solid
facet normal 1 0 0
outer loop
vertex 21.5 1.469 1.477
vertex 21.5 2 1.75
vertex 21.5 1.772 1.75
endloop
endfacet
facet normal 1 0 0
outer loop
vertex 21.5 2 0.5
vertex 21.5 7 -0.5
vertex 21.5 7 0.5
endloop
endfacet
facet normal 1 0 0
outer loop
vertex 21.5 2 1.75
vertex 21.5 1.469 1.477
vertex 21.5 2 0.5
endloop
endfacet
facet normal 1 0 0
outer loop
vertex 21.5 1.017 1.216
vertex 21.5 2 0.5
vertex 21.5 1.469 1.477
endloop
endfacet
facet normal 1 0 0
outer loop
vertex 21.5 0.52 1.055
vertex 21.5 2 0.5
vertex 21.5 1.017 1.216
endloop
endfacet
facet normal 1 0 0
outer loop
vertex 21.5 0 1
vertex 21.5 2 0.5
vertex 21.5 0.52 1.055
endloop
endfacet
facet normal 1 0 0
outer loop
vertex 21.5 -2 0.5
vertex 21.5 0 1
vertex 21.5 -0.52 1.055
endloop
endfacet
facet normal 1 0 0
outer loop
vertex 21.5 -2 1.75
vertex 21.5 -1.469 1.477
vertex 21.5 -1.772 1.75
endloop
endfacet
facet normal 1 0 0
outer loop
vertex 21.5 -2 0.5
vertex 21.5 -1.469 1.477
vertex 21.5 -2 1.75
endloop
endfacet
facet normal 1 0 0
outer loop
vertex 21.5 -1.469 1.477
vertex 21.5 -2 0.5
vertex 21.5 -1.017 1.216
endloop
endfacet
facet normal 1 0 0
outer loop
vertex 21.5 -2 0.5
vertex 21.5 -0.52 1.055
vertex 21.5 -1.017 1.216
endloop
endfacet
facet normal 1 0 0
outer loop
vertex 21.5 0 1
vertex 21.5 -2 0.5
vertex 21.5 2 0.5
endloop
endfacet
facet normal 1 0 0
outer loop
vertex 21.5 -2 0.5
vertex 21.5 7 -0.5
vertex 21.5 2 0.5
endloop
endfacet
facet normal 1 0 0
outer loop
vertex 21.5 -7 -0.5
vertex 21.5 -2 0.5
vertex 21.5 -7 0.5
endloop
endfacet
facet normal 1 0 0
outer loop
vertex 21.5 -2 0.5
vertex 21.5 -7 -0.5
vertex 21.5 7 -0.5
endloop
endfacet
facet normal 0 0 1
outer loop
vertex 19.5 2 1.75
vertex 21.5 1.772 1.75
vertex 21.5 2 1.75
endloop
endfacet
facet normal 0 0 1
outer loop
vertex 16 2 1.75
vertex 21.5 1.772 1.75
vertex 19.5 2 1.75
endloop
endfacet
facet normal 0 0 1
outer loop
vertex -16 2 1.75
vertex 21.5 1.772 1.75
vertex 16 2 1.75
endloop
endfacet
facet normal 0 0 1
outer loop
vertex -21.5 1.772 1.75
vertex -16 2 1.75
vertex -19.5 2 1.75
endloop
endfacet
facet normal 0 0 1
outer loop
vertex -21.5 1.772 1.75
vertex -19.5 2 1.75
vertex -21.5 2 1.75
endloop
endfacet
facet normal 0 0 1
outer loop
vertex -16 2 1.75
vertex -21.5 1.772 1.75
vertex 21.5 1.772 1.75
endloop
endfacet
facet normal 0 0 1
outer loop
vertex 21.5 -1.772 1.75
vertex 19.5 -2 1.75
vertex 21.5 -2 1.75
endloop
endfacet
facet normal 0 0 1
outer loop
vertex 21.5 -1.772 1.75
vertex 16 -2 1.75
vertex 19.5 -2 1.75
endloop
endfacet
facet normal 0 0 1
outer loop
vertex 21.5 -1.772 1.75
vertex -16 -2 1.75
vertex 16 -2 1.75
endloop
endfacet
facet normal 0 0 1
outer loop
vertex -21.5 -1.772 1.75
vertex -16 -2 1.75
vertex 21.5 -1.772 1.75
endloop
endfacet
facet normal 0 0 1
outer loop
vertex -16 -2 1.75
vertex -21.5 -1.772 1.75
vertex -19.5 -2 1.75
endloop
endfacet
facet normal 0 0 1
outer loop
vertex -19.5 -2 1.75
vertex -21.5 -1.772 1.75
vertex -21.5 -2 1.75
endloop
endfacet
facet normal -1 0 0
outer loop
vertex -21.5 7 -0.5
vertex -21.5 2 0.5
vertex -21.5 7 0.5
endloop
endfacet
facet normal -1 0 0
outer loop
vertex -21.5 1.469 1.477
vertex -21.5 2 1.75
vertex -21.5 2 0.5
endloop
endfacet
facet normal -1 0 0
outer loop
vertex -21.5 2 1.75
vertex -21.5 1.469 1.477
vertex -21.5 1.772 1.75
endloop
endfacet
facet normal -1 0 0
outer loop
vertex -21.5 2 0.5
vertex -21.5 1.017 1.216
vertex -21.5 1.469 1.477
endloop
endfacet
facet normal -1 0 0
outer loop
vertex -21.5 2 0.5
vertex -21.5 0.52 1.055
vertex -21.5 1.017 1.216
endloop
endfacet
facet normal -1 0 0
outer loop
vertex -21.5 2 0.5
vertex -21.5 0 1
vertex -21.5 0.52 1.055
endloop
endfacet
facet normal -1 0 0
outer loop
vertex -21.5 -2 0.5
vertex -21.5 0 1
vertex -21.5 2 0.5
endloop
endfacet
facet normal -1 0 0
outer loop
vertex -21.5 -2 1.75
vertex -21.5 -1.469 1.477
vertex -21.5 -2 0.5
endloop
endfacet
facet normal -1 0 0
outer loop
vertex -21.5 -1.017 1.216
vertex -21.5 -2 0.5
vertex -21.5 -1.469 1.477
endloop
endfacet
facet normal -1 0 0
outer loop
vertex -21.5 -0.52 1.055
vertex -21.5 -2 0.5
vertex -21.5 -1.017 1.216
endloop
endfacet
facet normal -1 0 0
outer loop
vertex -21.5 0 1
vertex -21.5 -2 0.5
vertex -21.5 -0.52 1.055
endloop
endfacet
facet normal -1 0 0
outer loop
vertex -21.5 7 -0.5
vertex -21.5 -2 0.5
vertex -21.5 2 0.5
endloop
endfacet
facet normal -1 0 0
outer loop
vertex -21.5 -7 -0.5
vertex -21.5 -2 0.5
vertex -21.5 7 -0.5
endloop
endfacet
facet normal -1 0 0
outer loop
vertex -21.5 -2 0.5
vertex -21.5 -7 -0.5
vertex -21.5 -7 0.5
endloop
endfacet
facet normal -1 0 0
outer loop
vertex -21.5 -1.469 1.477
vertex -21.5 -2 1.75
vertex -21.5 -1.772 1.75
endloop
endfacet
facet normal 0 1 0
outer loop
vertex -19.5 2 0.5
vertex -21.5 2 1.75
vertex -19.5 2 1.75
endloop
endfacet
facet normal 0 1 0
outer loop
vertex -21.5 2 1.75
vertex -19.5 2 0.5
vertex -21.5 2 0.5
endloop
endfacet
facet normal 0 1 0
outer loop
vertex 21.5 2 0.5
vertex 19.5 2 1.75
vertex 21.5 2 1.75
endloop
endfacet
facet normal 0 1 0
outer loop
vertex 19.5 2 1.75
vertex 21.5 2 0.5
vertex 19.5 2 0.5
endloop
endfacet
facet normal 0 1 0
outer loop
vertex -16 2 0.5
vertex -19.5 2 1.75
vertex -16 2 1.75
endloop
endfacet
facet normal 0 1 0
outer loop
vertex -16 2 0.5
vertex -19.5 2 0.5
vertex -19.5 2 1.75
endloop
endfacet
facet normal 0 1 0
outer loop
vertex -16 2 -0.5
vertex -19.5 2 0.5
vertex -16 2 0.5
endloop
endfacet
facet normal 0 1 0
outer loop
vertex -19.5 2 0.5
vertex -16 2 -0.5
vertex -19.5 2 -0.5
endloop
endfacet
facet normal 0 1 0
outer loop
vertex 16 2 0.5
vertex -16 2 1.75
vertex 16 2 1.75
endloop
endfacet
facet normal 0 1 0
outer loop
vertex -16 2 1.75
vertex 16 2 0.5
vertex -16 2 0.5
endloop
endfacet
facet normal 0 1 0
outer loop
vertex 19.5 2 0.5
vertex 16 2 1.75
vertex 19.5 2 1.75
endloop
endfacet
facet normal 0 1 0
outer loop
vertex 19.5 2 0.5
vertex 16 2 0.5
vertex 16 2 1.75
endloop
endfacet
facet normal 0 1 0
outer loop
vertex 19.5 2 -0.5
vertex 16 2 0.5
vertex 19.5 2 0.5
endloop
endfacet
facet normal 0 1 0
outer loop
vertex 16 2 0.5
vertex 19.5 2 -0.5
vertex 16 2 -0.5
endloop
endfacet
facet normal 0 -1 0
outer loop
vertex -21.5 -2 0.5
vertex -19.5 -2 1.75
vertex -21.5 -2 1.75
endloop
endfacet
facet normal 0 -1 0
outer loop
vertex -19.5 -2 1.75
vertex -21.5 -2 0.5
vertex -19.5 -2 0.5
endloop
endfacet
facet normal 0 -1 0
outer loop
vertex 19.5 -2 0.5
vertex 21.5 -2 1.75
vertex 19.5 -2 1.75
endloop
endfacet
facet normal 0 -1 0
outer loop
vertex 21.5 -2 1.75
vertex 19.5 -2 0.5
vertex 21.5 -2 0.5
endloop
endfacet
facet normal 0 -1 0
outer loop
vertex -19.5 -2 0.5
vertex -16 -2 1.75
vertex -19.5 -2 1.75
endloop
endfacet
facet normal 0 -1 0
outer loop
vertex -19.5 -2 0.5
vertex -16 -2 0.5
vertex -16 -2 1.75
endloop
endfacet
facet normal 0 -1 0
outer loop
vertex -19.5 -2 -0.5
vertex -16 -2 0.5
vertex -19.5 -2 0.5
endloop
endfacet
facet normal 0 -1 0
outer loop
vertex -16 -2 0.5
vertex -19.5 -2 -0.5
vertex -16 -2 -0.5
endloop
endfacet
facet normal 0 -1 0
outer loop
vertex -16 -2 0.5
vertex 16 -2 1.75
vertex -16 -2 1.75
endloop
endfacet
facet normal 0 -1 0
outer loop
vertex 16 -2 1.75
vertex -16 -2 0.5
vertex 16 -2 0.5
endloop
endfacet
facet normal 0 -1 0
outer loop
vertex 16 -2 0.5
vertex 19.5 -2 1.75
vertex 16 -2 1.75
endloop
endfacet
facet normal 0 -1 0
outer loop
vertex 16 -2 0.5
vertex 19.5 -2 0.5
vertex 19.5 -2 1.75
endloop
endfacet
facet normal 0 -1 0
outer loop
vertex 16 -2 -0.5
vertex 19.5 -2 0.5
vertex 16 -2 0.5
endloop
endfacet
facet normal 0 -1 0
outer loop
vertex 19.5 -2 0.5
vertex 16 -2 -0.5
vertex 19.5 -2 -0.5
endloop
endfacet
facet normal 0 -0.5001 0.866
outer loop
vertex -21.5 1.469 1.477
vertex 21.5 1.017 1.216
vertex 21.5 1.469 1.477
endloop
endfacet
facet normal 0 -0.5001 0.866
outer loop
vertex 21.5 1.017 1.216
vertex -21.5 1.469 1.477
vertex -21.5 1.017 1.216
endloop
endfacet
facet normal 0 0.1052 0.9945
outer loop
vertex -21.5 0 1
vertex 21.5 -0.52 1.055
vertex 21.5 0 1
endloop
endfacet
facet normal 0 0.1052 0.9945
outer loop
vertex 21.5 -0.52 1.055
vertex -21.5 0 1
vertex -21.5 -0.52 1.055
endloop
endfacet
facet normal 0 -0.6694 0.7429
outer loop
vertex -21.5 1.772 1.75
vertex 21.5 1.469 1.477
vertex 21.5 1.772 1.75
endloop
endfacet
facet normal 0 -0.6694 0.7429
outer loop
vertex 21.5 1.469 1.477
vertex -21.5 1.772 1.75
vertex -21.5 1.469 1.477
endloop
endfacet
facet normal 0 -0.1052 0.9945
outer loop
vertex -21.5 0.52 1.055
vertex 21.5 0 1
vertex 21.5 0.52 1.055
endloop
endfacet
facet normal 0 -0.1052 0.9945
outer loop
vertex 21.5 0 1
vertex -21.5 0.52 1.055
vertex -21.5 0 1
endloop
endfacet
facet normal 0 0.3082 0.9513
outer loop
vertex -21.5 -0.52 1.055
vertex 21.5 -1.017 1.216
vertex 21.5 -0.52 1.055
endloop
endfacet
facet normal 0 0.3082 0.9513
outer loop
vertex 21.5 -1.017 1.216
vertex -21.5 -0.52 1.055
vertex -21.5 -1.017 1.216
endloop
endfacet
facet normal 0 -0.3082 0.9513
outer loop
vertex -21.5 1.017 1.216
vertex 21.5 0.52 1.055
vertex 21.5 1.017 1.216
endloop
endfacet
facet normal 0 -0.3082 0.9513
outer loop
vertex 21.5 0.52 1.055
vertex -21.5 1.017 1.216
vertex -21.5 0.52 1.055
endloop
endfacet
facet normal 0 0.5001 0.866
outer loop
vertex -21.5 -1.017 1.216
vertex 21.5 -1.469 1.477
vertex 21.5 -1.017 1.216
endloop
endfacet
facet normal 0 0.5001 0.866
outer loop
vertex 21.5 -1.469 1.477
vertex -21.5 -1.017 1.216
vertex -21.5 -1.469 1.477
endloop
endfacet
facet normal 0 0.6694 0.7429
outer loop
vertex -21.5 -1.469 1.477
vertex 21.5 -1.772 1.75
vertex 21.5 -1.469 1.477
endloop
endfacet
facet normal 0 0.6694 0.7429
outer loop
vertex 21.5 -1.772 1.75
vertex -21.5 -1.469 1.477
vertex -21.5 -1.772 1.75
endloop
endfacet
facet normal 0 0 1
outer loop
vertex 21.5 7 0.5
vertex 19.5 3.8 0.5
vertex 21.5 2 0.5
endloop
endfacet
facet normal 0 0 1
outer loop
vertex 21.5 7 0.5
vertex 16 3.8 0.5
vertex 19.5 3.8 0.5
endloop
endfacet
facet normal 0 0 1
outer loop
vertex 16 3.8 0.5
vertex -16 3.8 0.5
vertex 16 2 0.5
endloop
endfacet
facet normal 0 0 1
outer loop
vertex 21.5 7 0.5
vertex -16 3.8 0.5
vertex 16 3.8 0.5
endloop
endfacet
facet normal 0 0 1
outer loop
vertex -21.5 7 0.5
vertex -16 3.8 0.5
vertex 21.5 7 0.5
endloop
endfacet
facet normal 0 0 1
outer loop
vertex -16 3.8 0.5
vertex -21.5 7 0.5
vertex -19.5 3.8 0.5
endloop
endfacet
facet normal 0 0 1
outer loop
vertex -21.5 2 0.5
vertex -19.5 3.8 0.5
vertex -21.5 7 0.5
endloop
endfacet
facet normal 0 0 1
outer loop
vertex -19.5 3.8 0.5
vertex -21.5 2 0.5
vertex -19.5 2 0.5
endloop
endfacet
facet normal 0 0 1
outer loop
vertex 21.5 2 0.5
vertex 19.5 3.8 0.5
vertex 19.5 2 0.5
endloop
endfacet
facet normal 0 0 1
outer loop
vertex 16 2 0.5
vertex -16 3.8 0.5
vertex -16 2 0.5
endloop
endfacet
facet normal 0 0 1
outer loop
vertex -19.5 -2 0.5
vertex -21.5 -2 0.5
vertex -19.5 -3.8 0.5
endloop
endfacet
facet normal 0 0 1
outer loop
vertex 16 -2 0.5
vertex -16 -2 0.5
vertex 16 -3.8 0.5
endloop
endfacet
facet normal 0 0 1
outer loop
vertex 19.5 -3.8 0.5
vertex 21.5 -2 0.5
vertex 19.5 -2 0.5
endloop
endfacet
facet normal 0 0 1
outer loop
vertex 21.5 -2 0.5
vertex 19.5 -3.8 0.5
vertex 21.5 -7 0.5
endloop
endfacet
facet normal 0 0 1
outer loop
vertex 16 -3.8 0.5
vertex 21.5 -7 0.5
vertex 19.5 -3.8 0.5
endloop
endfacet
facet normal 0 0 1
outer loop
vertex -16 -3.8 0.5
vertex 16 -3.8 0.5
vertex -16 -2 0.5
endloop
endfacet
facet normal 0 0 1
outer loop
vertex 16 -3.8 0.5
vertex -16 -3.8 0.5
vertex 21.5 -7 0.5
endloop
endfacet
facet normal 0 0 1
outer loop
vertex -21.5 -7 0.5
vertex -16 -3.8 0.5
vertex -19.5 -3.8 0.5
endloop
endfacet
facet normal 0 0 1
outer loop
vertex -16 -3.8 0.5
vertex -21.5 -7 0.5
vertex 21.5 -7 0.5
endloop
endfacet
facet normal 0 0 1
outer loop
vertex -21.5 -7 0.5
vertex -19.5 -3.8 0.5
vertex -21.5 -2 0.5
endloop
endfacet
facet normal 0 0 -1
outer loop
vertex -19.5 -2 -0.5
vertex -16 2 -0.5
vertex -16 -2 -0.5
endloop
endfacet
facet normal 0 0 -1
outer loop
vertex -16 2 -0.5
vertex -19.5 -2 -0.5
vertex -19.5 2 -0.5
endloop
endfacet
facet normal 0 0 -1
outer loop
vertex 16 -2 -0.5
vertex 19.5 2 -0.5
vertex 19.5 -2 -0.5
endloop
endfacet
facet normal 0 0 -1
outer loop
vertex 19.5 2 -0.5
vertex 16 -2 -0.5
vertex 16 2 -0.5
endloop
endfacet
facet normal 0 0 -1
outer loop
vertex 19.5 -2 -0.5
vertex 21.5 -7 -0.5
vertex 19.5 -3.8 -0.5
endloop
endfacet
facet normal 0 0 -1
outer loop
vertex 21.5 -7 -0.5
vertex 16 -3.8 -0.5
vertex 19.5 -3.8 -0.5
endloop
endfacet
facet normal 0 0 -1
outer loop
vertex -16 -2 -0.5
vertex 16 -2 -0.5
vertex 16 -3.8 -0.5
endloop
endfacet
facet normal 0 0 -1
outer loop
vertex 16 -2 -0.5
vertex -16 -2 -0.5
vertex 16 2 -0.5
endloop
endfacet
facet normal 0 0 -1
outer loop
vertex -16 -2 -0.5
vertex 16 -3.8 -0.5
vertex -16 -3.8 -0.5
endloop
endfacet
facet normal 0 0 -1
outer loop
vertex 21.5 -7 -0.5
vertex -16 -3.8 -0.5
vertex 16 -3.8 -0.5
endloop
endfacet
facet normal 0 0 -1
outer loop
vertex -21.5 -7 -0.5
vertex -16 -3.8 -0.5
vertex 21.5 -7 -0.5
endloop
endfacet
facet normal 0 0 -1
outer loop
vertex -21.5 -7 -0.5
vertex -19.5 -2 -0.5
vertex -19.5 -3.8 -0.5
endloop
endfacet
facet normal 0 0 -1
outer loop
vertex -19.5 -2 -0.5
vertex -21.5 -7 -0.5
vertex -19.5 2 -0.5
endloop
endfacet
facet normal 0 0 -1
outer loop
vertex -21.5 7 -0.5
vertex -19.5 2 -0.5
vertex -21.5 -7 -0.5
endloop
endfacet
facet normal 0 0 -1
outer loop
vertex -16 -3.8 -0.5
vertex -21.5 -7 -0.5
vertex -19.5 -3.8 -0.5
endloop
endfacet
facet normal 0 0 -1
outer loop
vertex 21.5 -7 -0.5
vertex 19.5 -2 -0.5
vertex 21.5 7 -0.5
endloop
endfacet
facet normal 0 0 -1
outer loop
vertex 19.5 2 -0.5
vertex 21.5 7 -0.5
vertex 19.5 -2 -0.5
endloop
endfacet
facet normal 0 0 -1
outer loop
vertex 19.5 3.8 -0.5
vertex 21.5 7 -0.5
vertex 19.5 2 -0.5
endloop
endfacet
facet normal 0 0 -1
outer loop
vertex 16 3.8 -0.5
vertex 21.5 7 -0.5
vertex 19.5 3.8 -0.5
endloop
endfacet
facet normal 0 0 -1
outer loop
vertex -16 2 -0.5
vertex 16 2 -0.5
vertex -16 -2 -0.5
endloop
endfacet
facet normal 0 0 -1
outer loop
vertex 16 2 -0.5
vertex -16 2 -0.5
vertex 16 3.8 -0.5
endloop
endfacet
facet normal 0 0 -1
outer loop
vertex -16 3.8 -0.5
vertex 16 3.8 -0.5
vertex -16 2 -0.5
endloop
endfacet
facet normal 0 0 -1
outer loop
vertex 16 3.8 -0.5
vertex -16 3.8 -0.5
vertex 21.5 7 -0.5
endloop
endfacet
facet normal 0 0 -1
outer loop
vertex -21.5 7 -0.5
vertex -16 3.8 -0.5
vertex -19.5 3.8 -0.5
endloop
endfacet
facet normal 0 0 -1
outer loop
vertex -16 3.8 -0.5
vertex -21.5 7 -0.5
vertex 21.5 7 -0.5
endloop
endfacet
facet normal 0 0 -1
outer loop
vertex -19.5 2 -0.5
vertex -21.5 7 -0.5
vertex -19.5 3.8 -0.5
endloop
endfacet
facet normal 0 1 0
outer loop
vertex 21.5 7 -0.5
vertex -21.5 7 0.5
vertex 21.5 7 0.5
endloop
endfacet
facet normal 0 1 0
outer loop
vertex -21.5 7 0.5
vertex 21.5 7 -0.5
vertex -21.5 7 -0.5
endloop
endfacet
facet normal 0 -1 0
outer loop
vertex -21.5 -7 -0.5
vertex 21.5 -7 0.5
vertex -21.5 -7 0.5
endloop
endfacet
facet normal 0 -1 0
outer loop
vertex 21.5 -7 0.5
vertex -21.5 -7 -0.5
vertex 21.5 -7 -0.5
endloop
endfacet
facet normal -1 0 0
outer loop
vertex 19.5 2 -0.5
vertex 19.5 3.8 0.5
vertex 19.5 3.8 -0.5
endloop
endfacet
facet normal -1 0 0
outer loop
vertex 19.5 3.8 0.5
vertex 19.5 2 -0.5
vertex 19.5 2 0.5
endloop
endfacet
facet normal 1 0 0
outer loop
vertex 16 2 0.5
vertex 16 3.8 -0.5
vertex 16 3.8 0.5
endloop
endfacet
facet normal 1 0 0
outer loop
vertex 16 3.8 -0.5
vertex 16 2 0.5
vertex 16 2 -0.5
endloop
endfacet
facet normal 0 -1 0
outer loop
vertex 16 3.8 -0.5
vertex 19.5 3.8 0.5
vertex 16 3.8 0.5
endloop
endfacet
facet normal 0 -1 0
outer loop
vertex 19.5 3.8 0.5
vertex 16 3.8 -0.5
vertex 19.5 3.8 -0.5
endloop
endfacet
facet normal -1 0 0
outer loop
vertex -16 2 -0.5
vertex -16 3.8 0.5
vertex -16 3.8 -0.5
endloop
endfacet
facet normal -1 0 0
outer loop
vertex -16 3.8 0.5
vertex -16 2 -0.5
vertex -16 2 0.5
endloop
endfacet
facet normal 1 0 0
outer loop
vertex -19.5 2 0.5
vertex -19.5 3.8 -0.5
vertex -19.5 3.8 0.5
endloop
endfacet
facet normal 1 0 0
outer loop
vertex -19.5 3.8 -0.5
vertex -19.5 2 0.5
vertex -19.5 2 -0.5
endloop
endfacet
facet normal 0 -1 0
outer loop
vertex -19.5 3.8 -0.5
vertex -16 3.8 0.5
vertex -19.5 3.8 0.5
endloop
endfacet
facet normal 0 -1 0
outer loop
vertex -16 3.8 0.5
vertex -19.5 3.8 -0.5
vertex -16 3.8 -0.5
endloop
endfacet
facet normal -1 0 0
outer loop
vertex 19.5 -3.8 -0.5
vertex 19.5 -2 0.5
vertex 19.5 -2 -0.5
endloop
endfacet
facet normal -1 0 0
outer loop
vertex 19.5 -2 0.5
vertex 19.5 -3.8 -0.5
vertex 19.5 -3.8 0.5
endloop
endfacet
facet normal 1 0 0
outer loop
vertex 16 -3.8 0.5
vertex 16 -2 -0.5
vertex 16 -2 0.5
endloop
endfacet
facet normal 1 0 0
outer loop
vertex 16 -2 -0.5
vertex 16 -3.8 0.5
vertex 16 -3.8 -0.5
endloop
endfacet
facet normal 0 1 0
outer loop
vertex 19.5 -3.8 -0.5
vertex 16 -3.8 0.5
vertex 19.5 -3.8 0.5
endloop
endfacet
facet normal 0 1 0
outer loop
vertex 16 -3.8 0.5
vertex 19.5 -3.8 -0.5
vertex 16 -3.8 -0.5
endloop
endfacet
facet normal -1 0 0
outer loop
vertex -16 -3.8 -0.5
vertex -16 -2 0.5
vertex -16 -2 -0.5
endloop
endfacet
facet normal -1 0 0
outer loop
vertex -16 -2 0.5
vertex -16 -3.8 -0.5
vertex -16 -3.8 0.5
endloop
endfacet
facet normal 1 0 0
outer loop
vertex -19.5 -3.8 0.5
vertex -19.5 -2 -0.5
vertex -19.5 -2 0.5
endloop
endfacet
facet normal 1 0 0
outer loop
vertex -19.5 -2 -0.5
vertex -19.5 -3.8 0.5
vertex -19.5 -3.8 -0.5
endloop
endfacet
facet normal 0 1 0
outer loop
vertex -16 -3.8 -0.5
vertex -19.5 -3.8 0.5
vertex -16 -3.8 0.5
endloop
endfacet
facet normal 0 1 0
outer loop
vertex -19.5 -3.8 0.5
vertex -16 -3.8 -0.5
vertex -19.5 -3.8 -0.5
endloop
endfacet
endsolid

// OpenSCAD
//Width of the label area
labelWidth = 12; //[6,9,12,18]
//Length of the label area
labelLength = 30; //[10:100]
//Diameter of your cable
cableDiameter = 5; //[3:1:10]
//Cable tie type
cableTieW = 2.5; //[2.5:T18, 3.5:T30, 4.6:T50]

/* [Advanced] */
//Cable tie thickness
cableTieT = 1.3;
//Spacing between label area and cable tie hole
innerMargin = 1;
//Spacing between cable tie hole and outer edge
outerMargin = 2;

/* [Hidden] */
//Calculated variables
cableTieHoleW = cableTieW + 1;
cableTieHoleT = cableTieT + 0.5;
totalLength = labelLength + (innerMargin*2) + (outerMargin*2) + (cableTieHoleW*2);

cableTieHoleX = (labelLength/2)+(cableTieHoleW/2)+innerMargin;
cableTieHoleY = (cableDiameter*0.4)+(cableTieHoleT/2);

$fn=30;

difference(){
union(){
if (((cableDiameter*0.8)+(cableTieHoleT*2)) > labelWidth) {
    totalWidth = (cableDiameter*0.8)+(cableTieHoleT*2)+2;
    cube([totalLength, totalWidth, 1], center=true);
} else {
    totalWidth = labelWidth + 2;
    cube([totalLength, totalWidth, 1], center=true);
}
translate([0,0,1]) {
    difference(){
        cube([totalLength, cableDiameter*0.8, cableDiameter*0.3], center=true);
        translate([0,0,cableDiameter/2]) {
            rotate([0,90,0]) {
                cylinder(h=totalLength+1, d= cableDiameter, center=true);
            }
        }
    }
}
}
union(){
translate([cableTieHoleX,cableTieHoleY,0]) {
cube([cableTieHoleW, cableTieHoleT, 10], center=true);
}
translate([-1*cableTieHoleX,cableTieHoleY,0]) {
cube([cableTieHoleW, cableTieHoleT, 10], center=true);
}
translate([cableTieHoleX,-1*cableTieHoleY,0]) {
cube([cableTieHoleW, cableTieHoleT, 10], center=true);
}
translate([-1*cableTieHoleX,-1*cableTieHoleY,0]) {
cube([cableTieHoleW, cableTieHoleT, 10], center=true);
}
}
}
